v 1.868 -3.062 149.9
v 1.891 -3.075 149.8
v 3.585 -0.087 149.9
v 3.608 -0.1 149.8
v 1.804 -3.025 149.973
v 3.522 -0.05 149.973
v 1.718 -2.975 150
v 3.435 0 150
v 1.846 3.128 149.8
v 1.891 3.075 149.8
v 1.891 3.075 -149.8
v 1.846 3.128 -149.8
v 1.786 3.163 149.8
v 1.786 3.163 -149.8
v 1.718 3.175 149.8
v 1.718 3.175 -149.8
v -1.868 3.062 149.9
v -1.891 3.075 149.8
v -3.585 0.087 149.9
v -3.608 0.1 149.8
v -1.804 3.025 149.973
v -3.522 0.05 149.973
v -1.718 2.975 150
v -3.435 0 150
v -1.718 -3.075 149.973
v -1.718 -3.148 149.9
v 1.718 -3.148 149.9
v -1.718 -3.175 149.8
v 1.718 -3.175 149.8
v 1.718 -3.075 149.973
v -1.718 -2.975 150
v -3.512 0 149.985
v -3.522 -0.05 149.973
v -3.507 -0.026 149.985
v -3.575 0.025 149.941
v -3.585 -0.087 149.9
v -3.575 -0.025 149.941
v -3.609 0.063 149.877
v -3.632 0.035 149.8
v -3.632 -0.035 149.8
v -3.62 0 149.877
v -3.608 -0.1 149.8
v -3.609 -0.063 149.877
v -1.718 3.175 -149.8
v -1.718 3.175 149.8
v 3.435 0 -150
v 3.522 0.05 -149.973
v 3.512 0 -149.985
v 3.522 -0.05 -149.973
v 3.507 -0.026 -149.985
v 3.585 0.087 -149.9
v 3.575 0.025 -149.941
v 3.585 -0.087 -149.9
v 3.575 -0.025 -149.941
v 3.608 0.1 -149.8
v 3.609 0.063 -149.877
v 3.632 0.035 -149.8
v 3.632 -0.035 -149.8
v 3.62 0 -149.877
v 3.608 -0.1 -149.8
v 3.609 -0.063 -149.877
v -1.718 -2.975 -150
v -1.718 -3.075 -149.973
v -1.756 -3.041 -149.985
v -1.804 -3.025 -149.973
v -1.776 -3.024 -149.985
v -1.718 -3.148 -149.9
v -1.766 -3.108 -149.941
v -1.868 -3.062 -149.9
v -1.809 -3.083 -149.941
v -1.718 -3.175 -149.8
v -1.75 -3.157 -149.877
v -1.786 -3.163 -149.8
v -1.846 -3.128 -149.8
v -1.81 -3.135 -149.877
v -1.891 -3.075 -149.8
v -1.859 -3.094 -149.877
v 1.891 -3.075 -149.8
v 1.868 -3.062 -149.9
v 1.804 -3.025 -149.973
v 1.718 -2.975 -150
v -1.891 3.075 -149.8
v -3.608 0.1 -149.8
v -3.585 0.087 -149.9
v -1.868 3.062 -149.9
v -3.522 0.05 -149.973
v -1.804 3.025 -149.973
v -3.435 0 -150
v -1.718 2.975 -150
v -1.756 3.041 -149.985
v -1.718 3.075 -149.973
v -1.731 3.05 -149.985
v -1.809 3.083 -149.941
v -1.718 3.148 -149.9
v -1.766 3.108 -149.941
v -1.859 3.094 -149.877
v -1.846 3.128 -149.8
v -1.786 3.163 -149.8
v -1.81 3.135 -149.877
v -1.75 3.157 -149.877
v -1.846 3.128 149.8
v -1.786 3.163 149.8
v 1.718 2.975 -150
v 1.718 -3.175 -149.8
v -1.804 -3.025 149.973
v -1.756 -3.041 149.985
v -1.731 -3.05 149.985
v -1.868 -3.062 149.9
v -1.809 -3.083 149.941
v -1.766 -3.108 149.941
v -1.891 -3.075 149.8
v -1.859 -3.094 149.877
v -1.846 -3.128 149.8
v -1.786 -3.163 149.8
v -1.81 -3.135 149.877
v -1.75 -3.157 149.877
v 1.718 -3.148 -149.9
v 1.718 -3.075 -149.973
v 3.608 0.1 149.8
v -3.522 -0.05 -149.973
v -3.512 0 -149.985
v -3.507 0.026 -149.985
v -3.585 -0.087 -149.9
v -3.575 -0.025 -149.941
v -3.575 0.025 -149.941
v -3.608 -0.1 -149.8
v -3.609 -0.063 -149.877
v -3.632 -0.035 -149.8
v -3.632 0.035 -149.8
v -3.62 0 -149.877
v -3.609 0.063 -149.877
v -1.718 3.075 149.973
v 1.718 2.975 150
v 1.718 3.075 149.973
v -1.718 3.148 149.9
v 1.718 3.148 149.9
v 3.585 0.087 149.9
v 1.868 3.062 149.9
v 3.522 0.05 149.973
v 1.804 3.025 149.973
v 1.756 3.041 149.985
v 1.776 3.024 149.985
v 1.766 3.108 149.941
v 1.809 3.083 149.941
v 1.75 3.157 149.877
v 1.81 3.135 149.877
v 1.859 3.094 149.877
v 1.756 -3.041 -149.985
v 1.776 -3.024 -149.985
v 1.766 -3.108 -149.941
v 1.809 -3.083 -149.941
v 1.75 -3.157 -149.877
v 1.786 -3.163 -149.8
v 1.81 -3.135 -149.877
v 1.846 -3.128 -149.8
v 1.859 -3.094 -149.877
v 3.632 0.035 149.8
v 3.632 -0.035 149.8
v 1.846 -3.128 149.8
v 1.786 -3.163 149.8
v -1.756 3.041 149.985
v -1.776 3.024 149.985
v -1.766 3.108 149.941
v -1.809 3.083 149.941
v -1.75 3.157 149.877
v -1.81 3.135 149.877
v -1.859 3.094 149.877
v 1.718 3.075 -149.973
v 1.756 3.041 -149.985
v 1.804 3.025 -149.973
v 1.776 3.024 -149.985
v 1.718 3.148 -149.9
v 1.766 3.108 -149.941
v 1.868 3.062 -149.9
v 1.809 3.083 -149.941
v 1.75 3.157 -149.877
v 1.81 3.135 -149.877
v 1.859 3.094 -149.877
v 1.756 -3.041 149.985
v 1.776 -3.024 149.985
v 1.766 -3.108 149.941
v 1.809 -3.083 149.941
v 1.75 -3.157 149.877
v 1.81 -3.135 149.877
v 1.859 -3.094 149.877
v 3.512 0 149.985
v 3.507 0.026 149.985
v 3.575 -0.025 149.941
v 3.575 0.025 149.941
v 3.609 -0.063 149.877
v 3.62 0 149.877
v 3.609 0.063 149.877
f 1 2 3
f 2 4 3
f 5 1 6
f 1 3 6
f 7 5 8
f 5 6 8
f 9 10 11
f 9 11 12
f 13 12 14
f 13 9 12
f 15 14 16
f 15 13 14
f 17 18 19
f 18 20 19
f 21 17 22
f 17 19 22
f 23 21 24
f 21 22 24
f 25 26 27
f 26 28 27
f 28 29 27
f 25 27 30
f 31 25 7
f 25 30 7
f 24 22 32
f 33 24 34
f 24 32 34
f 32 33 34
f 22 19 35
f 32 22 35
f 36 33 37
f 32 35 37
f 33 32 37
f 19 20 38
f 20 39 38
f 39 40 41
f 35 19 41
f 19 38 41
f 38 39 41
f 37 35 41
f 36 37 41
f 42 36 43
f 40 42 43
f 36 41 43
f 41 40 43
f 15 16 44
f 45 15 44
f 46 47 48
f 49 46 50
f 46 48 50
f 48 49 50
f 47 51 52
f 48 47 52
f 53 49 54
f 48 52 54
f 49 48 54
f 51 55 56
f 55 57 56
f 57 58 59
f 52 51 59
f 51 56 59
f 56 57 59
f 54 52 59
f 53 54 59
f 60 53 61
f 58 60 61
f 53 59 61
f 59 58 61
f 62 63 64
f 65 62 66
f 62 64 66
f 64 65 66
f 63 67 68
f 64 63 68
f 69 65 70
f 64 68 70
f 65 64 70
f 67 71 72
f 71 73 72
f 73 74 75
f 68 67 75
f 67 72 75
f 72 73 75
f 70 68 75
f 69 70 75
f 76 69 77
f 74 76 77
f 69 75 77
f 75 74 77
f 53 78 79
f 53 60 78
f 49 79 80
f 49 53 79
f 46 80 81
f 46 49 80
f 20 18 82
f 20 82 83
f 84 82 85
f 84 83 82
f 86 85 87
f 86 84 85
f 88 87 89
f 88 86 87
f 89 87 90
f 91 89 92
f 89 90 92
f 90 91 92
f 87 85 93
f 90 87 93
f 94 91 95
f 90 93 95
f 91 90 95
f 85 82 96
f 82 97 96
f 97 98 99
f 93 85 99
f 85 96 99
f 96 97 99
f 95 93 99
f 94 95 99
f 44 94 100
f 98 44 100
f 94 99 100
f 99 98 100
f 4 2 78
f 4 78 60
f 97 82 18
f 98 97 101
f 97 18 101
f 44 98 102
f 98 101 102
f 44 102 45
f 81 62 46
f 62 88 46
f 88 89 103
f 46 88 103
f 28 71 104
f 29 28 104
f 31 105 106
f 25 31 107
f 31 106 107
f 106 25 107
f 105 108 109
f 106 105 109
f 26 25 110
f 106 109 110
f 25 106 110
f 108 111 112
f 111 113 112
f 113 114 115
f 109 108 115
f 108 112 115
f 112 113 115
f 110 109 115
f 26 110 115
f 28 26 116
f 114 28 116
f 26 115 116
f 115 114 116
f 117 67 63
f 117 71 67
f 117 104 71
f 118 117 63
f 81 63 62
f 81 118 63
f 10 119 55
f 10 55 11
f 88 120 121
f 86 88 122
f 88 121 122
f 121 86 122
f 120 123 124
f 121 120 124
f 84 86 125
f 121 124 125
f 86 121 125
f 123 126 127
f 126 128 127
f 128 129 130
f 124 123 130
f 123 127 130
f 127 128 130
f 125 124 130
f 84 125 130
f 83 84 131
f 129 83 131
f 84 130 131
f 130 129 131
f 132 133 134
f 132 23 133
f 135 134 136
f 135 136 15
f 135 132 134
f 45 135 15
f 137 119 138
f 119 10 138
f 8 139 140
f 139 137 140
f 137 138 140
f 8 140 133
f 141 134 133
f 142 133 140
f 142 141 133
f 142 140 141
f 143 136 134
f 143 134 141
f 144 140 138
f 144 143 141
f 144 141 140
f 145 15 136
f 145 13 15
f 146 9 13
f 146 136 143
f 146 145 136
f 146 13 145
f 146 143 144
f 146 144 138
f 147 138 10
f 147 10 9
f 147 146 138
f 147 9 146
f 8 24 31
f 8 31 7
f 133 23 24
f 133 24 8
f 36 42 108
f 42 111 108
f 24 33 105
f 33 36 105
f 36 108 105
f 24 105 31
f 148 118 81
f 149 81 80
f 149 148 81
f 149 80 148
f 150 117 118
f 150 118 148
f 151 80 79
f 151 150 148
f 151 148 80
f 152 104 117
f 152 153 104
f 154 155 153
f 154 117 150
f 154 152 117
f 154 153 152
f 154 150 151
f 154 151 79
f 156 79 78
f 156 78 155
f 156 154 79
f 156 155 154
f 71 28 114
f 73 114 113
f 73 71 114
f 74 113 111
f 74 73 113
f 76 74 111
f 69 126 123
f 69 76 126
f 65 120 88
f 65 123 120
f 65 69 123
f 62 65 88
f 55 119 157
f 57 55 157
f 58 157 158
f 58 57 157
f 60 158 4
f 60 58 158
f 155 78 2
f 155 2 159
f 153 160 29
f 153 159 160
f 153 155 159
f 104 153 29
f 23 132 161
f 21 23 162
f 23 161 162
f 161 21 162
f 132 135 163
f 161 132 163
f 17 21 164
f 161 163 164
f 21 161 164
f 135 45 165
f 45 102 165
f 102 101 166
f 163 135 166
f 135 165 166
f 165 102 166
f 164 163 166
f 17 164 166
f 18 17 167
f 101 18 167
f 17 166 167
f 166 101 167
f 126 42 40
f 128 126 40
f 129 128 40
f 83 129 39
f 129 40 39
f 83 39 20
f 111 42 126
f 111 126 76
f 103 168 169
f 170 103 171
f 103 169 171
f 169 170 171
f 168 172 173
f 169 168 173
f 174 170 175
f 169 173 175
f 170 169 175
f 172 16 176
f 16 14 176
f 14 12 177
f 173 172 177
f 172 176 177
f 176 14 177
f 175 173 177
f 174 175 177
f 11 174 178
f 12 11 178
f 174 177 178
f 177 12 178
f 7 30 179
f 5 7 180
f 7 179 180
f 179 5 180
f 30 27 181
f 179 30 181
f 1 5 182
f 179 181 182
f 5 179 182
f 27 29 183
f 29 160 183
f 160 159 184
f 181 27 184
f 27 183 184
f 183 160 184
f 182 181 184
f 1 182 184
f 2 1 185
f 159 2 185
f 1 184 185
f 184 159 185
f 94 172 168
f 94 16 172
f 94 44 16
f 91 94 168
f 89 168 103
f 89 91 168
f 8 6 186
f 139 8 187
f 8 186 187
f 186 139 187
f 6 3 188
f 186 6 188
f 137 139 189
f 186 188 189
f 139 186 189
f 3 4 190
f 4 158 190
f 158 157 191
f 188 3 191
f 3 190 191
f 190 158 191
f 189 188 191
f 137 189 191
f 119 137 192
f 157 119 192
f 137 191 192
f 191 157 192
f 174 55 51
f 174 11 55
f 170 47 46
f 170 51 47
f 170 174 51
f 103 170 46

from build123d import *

# Parameters (mm, degrees)
BOSS_EXTRUDE1_DEPTH = 150
FILLET1_R           = 0.2


with BuildPart() as part:
    # Sketch1 → Boss-Extrude1 (new, symmetric)
    with BuildSketch(Plane.XY):
        Polygon((3.666174209, 0), (1.833087105, 3.175), (-1.833087105, 3.175), (-3.666174209, 0), (-1.833087105, -3.175), (1.833087105, -3.175), align=None)
    extrude(amount=BOSS_EXTRUDE1_DEPTH, both=True)

    # Fillet1
    fillet1_edges = [part.edges().sort_by_distance(p)[0] for p in [
        (1.833087105, -3.175, 0),
        (-1.833087105, -3.175, 0),
        (-3.666174209, 0, 0),
        (-1.833087105, 3.175, 0),
        (1.833087105, 3.175, 0),
        (3.666174209, 0, 0),
        (0, 3.175, 150),
        (-2.749630657, 1.5875, 150),
        (-2.749630657, -1.5875, 150),
        (0, -3.175, 150),
        (2.749630657, -1.5875, 150),
        (0, -3.175, -150),
        (-2.749630657, -1.5875, -150),
        (-2.749630657, 1.5875, -150),
        (0, 3.175, -150),
        (2.749630657, 1.5875, -150),
        (2.749630657, -1.5875, -150),
        (2.749630657, 1.5875, 150),
    ]]
    fillet(fillet1_edges, radius=FILLET1_R)


solid = part.part
